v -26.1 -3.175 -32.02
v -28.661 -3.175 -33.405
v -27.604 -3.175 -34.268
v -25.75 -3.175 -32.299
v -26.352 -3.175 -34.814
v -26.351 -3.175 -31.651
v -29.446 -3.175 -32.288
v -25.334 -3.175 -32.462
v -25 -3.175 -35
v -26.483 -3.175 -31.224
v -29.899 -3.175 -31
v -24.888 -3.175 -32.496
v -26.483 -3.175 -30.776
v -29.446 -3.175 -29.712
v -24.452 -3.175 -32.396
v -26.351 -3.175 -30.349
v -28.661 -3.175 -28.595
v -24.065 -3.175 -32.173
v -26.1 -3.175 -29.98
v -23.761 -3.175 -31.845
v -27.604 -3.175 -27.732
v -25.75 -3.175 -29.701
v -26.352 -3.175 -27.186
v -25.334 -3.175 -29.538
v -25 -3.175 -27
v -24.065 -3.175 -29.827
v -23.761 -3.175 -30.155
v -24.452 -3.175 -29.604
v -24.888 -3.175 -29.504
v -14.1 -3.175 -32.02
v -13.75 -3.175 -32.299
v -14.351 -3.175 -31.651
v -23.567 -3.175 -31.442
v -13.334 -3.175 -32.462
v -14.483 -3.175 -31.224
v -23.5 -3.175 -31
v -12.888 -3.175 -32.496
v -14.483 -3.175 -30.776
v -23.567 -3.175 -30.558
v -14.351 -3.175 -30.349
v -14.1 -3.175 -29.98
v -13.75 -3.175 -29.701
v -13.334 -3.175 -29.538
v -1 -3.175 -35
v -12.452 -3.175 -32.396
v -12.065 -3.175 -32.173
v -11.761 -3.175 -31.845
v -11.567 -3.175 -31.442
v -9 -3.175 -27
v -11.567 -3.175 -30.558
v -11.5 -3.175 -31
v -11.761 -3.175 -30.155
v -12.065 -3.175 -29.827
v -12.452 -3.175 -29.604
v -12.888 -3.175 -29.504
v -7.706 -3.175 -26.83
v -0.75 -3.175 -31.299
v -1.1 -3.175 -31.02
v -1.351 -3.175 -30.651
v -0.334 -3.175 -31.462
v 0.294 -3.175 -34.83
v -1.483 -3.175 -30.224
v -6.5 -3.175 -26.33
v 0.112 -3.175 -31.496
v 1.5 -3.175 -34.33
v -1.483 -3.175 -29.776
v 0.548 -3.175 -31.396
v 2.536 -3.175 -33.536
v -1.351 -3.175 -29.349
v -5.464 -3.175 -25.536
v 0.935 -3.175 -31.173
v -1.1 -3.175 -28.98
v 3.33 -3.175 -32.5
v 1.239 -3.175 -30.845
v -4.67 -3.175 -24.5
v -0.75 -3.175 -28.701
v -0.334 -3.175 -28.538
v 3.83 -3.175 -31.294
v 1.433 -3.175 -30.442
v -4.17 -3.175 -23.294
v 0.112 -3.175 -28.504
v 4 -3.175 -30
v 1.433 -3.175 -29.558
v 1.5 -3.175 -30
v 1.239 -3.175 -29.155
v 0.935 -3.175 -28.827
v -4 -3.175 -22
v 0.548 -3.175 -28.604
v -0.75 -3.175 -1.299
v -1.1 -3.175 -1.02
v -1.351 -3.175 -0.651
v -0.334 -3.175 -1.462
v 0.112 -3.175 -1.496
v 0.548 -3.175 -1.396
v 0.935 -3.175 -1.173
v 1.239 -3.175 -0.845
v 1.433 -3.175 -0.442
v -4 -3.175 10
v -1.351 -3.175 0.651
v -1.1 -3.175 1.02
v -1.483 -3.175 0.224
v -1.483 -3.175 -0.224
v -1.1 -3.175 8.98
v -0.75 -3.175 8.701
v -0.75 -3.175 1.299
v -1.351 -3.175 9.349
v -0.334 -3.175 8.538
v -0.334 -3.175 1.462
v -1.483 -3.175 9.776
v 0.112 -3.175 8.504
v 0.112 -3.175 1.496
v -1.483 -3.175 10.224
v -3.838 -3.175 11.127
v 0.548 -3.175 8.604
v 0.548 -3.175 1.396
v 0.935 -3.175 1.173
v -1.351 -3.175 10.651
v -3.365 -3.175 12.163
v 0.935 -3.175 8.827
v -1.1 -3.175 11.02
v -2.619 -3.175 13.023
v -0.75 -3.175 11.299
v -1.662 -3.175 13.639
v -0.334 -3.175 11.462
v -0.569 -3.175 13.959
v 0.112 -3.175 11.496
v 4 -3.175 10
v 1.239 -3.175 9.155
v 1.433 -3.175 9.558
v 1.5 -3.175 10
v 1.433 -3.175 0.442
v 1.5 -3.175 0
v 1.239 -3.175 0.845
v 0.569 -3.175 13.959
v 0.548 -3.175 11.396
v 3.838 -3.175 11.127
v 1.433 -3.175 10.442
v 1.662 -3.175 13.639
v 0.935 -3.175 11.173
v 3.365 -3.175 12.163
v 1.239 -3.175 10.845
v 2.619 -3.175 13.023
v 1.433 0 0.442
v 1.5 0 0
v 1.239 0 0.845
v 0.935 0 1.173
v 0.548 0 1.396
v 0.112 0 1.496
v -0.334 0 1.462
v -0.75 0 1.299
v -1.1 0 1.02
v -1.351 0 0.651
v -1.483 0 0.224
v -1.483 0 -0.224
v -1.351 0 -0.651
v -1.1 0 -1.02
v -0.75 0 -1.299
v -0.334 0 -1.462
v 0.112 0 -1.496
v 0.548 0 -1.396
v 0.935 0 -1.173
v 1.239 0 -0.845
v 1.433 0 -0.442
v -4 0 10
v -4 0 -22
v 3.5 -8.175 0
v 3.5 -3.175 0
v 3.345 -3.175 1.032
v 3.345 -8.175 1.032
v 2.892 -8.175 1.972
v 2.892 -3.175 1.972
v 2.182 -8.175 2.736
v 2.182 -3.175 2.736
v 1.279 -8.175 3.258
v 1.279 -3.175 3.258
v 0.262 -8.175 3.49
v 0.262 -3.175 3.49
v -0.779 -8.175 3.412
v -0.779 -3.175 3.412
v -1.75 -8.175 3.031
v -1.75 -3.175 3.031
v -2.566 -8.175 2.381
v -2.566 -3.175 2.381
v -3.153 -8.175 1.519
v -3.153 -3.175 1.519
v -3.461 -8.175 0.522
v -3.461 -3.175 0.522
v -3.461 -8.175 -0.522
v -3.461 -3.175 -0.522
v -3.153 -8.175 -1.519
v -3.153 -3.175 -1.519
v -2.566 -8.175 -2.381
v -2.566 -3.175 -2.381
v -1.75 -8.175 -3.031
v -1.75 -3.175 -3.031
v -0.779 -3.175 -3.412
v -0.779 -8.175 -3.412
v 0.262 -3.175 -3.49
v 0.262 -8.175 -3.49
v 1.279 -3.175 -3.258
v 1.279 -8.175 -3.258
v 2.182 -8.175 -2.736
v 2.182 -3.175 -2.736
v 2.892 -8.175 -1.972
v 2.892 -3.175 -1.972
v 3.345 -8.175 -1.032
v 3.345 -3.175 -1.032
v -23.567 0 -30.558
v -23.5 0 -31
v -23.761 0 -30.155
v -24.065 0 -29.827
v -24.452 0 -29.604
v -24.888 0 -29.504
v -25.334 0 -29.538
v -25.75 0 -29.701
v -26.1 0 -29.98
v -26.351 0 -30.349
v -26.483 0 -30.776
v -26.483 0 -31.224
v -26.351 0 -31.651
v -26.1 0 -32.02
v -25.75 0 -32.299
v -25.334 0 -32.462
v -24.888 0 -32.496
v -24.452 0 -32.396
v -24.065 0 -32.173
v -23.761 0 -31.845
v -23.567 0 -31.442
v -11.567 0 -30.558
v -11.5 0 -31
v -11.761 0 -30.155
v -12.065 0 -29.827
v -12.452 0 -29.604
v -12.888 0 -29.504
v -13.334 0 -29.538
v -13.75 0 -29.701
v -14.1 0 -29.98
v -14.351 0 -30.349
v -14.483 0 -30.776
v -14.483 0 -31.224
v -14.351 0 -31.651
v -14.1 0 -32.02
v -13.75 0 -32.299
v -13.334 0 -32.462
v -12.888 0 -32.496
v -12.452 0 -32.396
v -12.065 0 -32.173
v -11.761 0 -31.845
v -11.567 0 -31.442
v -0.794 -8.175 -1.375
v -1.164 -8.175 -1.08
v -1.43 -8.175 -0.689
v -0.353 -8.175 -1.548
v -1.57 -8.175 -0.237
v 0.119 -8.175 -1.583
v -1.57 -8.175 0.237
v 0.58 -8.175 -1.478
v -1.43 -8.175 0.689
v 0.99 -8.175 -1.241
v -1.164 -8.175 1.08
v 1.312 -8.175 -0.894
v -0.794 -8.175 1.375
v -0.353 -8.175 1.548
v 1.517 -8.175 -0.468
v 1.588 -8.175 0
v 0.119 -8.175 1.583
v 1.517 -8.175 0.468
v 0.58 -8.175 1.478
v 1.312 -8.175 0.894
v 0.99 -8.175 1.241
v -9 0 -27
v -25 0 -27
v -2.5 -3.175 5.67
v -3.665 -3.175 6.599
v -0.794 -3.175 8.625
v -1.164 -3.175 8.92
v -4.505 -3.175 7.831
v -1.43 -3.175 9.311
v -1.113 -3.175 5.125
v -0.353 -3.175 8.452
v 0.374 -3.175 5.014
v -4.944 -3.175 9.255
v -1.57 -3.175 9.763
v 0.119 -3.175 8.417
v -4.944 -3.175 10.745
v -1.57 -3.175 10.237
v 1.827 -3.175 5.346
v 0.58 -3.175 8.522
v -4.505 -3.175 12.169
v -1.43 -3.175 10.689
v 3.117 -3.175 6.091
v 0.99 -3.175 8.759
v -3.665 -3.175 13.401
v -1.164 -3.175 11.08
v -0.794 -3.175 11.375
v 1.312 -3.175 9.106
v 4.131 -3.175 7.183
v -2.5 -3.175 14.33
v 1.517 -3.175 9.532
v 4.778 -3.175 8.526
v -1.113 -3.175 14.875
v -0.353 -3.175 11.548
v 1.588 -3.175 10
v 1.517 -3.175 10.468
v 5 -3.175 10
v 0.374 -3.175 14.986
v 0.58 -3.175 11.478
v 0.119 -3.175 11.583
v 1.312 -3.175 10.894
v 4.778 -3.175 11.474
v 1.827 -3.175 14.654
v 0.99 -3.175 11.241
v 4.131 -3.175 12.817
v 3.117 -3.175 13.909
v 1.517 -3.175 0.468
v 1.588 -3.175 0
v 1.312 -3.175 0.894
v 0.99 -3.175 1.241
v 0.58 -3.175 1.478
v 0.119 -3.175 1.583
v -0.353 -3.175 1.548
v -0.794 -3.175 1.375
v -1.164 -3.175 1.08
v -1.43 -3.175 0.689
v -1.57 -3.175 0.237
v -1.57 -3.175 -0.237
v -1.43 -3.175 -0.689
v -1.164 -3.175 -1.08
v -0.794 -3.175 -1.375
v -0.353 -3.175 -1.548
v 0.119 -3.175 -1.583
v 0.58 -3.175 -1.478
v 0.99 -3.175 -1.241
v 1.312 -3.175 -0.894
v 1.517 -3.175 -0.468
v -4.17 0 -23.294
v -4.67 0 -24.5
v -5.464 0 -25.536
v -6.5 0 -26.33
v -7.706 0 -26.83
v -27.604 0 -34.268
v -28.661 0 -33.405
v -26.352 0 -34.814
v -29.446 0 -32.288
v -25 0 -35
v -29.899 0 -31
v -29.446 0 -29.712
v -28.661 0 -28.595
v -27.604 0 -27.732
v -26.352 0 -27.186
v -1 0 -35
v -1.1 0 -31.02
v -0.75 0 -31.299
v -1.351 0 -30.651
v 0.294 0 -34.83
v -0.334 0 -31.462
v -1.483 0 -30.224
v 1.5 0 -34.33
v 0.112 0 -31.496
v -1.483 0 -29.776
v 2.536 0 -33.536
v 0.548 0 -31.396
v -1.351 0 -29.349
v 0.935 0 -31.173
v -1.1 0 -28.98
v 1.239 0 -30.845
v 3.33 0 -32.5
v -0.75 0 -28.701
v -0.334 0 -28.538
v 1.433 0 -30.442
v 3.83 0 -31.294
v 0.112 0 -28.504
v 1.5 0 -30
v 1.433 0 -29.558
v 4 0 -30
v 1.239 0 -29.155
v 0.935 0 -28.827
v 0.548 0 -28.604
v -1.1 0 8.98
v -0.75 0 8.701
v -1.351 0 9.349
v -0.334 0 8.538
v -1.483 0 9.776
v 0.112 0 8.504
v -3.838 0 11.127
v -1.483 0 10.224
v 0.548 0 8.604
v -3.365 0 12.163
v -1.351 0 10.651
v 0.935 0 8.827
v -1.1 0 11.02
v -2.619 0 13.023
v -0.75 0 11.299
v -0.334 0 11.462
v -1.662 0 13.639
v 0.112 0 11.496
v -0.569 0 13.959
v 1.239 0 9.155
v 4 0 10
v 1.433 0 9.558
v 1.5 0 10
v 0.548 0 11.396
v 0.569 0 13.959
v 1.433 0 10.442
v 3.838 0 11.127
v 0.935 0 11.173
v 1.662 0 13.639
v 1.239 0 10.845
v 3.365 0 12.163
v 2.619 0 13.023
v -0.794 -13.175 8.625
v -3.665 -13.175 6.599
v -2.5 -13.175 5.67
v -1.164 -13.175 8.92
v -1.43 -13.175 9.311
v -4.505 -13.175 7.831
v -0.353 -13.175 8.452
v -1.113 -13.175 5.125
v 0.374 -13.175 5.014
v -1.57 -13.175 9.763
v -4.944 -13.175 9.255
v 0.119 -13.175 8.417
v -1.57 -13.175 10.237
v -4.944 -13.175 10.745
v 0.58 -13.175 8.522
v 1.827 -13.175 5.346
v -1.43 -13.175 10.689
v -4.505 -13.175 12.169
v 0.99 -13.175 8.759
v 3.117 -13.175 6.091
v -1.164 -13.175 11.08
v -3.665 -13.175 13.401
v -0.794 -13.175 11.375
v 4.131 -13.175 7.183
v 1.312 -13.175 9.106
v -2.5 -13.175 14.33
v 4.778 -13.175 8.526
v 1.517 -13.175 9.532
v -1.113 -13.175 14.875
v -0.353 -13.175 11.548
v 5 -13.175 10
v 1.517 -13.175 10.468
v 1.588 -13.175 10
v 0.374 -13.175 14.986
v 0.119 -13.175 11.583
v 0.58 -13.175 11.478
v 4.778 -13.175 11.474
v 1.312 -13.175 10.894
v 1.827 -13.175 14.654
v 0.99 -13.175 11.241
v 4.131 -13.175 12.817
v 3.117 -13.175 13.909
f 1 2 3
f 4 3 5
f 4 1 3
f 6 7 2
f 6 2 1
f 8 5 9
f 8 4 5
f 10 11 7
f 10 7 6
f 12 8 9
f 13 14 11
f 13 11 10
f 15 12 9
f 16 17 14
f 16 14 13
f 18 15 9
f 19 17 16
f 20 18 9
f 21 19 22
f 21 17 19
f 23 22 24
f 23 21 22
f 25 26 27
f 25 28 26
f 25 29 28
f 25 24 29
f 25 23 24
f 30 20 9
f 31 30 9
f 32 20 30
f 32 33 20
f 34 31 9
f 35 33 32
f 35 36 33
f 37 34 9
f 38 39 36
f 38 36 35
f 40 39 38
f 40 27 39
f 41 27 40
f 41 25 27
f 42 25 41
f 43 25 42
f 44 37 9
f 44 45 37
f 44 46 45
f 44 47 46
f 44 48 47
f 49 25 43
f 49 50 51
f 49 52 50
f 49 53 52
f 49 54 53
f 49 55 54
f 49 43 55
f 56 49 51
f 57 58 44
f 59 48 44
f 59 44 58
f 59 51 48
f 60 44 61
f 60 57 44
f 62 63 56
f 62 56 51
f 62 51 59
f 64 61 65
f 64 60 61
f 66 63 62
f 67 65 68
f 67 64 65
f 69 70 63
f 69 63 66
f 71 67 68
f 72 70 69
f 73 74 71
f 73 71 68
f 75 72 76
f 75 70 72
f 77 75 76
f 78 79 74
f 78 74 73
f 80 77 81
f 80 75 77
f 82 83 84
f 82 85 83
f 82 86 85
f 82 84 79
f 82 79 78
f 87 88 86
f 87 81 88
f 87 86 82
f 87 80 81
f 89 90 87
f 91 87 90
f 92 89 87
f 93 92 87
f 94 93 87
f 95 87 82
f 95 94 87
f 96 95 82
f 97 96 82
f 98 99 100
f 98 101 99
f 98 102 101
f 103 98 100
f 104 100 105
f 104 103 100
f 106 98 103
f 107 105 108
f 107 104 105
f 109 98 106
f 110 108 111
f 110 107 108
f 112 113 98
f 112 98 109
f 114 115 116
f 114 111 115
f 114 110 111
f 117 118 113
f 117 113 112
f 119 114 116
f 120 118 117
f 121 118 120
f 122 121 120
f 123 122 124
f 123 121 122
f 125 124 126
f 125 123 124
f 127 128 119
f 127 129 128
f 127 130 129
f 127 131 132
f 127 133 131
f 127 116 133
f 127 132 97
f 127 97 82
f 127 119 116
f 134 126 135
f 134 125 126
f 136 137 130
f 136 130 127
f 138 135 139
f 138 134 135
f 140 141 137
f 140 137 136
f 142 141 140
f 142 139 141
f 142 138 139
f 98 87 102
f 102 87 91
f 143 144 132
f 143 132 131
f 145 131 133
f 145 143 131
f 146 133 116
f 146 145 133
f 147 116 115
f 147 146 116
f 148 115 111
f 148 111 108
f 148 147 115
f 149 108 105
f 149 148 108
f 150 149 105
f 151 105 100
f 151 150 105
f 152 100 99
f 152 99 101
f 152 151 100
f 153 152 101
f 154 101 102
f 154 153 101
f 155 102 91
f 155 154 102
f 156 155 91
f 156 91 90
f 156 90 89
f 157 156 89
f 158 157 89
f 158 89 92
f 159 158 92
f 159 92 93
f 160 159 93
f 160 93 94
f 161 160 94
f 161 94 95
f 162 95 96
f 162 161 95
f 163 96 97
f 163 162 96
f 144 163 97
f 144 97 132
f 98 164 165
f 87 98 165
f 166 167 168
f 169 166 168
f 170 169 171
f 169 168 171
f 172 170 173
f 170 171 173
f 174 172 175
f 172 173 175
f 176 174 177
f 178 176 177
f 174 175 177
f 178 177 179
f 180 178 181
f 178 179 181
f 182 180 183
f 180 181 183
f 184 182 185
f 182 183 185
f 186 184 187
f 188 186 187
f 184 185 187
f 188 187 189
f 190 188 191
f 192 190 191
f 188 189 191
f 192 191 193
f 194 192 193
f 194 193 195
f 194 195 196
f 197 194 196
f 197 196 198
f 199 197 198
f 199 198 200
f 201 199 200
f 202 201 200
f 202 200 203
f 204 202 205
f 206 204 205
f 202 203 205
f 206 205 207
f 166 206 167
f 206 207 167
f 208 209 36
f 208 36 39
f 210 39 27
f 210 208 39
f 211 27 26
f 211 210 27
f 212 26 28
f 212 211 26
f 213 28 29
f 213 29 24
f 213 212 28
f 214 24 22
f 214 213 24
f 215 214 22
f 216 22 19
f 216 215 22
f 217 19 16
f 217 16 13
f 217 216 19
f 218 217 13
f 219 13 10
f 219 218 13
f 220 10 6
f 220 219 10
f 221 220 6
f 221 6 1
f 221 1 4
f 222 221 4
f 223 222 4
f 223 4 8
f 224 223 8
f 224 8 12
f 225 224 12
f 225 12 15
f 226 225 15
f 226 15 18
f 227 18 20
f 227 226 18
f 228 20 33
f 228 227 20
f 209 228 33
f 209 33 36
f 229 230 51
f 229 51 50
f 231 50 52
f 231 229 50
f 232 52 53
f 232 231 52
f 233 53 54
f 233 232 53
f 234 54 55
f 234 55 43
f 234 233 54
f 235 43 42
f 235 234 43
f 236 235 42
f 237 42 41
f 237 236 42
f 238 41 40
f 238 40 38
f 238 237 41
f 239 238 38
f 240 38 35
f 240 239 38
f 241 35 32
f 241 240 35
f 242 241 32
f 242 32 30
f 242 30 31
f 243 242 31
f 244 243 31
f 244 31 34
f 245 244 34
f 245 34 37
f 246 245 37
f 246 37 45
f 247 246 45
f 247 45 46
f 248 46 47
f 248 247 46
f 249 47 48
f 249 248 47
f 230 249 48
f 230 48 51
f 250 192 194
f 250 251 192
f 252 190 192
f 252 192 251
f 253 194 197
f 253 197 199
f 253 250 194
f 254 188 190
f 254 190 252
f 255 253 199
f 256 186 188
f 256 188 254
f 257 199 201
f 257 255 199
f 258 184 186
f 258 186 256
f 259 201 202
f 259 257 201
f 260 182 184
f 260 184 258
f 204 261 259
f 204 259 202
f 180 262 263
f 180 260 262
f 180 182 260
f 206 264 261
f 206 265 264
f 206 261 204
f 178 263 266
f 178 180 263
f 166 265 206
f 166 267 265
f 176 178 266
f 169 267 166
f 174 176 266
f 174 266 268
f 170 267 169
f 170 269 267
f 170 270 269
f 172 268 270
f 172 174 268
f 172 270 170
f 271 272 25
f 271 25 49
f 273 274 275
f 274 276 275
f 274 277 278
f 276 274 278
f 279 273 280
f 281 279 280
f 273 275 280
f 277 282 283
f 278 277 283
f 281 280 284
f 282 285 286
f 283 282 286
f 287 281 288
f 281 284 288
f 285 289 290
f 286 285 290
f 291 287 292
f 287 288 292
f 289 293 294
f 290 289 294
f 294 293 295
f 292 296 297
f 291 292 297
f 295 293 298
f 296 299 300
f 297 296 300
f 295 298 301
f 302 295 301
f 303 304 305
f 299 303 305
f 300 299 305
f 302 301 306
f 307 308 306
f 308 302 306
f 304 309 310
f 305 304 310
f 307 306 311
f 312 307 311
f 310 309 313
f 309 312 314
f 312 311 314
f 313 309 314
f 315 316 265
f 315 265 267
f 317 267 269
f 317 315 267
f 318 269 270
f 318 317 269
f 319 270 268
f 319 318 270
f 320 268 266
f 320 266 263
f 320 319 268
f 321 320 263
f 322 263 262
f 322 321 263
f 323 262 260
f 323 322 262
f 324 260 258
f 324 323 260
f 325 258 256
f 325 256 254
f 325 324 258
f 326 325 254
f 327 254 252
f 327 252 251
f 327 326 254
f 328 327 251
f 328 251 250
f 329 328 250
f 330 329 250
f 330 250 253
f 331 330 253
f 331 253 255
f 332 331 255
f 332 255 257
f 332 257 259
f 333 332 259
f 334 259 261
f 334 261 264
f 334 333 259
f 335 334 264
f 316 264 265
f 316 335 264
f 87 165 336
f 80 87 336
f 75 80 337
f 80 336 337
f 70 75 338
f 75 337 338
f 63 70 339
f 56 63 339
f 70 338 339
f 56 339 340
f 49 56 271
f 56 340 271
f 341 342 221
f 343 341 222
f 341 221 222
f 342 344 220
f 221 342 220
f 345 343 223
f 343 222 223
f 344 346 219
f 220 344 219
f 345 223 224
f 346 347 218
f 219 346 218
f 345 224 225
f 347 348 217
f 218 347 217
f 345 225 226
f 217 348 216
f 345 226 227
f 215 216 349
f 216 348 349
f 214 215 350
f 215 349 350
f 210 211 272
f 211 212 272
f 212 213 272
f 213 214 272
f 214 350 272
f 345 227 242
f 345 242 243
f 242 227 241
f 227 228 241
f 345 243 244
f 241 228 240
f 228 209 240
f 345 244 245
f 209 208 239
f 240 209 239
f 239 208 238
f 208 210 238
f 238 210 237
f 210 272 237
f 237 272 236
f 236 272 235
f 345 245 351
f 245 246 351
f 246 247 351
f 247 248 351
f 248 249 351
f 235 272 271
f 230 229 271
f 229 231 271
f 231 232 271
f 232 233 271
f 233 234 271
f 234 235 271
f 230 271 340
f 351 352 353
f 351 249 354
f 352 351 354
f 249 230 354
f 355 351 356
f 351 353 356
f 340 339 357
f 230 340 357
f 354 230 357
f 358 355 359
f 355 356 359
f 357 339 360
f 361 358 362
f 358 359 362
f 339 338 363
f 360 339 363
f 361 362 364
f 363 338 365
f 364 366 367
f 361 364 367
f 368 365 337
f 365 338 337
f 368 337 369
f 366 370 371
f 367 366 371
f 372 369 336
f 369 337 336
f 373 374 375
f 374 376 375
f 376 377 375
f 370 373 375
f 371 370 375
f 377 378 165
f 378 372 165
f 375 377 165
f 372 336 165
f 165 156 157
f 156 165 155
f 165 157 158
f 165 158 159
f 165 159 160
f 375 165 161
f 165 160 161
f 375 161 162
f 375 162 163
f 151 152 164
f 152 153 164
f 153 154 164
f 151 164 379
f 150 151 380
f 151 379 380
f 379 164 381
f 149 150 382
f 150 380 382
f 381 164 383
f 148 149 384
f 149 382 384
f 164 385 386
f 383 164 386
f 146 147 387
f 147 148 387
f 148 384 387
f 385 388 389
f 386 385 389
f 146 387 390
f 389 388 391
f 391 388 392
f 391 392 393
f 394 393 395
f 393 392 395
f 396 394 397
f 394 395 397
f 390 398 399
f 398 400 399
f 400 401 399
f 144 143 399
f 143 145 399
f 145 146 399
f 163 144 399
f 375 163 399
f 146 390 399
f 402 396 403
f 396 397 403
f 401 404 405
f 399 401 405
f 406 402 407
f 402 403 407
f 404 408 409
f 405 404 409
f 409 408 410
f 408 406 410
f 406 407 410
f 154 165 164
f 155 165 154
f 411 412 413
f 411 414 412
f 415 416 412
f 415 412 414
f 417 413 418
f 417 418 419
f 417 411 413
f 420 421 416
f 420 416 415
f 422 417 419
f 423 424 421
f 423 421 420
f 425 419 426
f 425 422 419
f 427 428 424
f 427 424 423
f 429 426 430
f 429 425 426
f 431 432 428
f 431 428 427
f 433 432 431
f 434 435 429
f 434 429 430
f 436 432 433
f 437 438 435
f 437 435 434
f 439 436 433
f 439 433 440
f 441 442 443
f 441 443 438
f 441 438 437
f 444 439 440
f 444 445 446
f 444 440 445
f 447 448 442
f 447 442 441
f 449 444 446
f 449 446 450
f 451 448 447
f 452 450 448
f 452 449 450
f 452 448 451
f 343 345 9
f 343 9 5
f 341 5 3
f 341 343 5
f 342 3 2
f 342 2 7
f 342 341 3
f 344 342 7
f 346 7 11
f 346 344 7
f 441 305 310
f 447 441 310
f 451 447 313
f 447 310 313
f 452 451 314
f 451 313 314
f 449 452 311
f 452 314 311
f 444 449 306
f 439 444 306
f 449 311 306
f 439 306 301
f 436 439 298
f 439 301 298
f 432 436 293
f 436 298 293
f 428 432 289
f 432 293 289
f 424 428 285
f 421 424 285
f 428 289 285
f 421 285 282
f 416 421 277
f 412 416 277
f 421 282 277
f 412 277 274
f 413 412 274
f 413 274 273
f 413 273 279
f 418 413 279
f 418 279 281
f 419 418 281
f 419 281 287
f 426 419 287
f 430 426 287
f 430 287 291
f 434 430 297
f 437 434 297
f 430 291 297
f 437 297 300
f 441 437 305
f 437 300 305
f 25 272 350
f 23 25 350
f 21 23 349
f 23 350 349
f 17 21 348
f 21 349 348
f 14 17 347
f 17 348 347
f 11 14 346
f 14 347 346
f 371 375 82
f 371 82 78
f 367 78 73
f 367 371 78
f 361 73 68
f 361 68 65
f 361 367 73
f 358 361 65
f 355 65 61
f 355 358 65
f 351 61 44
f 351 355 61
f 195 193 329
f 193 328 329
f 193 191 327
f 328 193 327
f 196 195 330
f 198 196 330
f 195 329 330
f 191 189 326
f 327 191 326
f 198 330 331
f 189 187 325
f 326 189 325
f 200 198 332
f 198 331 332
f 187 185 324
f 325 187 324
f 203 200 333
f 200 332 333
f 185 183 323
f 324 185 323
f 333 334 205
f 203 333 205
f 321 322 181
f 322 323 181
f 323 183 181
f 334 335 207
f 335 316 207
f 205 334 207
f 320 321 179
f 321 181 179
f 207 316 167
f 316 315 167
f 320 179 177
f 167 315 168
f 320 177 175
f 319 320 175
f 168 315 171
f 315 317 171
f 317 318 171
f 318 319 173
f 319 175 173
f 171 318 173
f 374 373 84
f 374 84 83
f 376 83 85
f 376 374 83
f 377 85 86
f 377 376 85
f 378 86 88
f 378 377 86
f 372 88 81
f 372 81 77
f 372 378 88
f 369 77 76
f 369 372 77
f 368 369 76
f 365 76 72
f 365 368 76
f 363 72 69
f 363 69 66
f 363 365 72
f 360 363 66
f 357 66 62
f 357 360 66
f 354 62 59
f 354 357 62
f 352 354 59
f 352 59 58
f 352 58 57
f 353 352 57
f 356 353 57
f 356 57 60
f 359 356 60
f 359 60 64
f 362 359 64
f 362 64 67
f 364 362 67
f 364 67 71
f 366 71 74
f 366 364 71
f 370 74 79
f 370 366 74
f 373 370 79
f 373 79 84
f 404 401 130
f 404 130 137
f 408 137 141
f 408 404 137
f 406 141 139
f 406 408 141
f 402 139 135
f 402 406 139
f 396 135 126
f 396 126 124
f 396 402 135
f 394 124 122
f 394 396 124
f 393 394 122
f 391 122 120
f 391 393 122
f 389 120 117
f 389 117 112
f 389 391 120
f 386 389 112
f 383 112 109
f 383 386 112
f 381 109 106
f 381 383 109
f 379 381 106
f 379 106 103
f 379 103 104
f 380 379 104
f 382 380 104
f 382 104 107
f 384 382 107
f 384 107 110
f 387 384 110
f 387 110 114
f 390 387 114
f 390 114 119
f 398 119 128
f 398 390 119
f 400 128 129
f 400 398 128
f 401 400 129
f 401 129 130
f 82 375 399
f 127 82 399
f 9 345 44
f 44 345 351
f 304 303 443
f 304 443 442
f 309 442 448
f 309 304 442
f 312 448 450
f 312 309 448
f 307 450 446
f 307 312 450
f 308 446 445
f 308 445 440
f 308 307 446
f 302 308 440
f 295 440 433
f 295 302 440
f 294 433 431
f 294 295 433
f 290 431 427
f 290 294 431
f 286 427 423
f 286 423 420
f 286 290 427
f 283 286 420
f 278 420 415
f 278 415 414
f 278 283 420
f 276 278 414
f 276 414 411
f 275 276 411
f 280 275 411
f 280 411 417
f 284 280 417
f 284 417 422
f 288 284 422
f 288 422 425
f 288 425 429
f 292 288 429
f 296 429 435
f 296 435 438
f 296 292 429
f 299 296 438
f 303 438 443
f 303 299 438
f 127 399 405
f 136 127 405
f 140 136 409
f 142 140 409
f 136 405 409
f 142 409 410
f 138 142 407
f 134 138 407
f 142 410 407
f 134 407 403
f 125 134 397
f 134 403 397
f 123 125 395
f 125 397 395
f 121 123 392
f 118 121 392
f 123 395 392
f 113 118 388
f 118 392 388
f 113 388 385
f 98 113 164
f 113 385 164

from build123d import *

# Parameters (mm, degrees)
F0_R        = 1.5
F0_W        = 8
F0_H        = 8
F0_W_2      = 26
F1_DEPTH    = 3.175
F2_T1_DEPTH = 3.175
F2_T3_DEPTH = 28.175
F3_R        = 5
F3_R_2      = 1.5875
F4_DEPTH    = 10
F5_R        = 3.5
F5_R_2      = 1.5875
F6_DEPTH    = 5


# Not quite as in the source:
# - a fillet or chamfer that OpenCascade refuses, or shapes differently, is made with other operations: its cross-section is extruded or revolved along the edge and cut away or added
# - a length typed as a fraction of an inch, garbled in the dataset ("3 / 203.2 mm" for 3/8 in), is restored


with BuildPart() as f1:
    # F0 (on Front) → F1 (new body)
    with BuildSketch(Plane.XZ):
        with BuildLine():
            ThreePointArc((4, 10), (0, 14), (-4, 10))
            ThreePointArc((-4, 10), (0, 6), (4, 10))
        make_face()
        with Locations((0, 10)):
            Circle(F0_R, mode=Mode.SUBTRACT)
        with BuildLine():
            ThreePointArc((4, 10), (0, 6), (-4, 10))
            Line((-4, 10), (-4, -27))
            Line((-4, -27), (4, -27))
            Line((4, -27), (4, 10))
        make_face()
        Circle(F0_R, mode=Mode.SUBTRACT)
        with Locations((0, -31)):
            Rectangle(F0_W, F0_H)
        with Locations((0, -30)):
            Circle(F0_R, mode=Mode.SUBTRACT)
        with Locations((-17, -31)):
            Rectangle(F0_W_2, F0_H)
        with Locations((-25, -31)):
            Circle(F0_R, mode=Mode.SUBTRACT)
        with Locations((-13, -31)):
            Circle(F0_R, mode=Mode.SUBTRACT)
    extrude(amount=F1_DEPTH)

    # F2: fillet of radius 5 on 4 edges, made by hand

    # F2_s2 → F2_t1 (join)
    with BuildSketch(Plane.XZ):
        with BuildLine():
            ThreePointArc((-4, -22), (-5.4644660941, -25.5355339059), (-9, -27))
            Line((-9, -27), (-4, -27))
            Line((-4, -27), (-4, -22))
        make_face()
    extrude(amount=F2_T1_DEPTH)

    # F2_s4 → F2_t3 (cut)
    with BuildSketch(Plane.XZ.offset(-12.5)):
        with BuildLine():
            ThreePointArc((4, -30), (2.5355339059, -33.5355339059), (-1, -35))
            Line((-1, -35), (4, -35))
            Line((4, -35), (4, -30))
        make_face()
        with BuildLine():
            ThreePointArc((-25, -27), (-28.5355339059, -28.4644660941), (-30, -32))
            Line((-30, -32), (-30, -27))
            Line((-30, -27), (-25, -27))
        make_face()
        with BuildLine():
            ThreePointArc((-25, -35), (-28.5355339059, -33.5355339059), (-30, -30))
            Line((-30, -30), (-30, -35))
            Line((-30, -35), (-25, -35))
        make_face()
    extrude(amount=F2_T3_DEPTH, mode=Mode.SUBTRACT)


with BuildPart() as f4:
    # F3 (on face) → F4 (new body)
    with BuildSketch(Plane.XZ.offset(3.175)):
        with Locations((0, 10)):
            Circle(F3_R)
        with Locations((0, 10)):
            Circle(F3_R_2, mode=Mode.SUBTRACT)
    extrude(amount=F4_DEPTH)


with BuildPart() as f6:
    # F5 (on face) → F6 (new body)
    with BuildSketch(Plane.XZ.offset(3.175)):
        Circle(F5_R)
        Circle(F5_R_2, mode=Mode.SUBTRACT)
    extrude(amount=F6_DEPTH)


solid = Compound([f1.part, f4.part, f6.part])
